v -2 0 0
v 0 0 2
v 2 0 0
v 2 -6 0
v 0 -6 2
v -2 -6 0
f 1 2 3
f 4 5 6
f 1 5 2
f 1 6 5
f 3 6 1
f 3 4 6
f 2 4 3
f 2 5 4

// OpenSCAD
// linear_extrude(height=10) circle(5,$fn=3);

module strecha(vyska, hloubka) {
  rotate(90, [1,0,0]) 
  linear_extrude(height=hloubka) 
  polygon(points=[[-vyska,0],[vyska,0],[0,vyska]]);
}

color("magenta") strecha(2,6);
